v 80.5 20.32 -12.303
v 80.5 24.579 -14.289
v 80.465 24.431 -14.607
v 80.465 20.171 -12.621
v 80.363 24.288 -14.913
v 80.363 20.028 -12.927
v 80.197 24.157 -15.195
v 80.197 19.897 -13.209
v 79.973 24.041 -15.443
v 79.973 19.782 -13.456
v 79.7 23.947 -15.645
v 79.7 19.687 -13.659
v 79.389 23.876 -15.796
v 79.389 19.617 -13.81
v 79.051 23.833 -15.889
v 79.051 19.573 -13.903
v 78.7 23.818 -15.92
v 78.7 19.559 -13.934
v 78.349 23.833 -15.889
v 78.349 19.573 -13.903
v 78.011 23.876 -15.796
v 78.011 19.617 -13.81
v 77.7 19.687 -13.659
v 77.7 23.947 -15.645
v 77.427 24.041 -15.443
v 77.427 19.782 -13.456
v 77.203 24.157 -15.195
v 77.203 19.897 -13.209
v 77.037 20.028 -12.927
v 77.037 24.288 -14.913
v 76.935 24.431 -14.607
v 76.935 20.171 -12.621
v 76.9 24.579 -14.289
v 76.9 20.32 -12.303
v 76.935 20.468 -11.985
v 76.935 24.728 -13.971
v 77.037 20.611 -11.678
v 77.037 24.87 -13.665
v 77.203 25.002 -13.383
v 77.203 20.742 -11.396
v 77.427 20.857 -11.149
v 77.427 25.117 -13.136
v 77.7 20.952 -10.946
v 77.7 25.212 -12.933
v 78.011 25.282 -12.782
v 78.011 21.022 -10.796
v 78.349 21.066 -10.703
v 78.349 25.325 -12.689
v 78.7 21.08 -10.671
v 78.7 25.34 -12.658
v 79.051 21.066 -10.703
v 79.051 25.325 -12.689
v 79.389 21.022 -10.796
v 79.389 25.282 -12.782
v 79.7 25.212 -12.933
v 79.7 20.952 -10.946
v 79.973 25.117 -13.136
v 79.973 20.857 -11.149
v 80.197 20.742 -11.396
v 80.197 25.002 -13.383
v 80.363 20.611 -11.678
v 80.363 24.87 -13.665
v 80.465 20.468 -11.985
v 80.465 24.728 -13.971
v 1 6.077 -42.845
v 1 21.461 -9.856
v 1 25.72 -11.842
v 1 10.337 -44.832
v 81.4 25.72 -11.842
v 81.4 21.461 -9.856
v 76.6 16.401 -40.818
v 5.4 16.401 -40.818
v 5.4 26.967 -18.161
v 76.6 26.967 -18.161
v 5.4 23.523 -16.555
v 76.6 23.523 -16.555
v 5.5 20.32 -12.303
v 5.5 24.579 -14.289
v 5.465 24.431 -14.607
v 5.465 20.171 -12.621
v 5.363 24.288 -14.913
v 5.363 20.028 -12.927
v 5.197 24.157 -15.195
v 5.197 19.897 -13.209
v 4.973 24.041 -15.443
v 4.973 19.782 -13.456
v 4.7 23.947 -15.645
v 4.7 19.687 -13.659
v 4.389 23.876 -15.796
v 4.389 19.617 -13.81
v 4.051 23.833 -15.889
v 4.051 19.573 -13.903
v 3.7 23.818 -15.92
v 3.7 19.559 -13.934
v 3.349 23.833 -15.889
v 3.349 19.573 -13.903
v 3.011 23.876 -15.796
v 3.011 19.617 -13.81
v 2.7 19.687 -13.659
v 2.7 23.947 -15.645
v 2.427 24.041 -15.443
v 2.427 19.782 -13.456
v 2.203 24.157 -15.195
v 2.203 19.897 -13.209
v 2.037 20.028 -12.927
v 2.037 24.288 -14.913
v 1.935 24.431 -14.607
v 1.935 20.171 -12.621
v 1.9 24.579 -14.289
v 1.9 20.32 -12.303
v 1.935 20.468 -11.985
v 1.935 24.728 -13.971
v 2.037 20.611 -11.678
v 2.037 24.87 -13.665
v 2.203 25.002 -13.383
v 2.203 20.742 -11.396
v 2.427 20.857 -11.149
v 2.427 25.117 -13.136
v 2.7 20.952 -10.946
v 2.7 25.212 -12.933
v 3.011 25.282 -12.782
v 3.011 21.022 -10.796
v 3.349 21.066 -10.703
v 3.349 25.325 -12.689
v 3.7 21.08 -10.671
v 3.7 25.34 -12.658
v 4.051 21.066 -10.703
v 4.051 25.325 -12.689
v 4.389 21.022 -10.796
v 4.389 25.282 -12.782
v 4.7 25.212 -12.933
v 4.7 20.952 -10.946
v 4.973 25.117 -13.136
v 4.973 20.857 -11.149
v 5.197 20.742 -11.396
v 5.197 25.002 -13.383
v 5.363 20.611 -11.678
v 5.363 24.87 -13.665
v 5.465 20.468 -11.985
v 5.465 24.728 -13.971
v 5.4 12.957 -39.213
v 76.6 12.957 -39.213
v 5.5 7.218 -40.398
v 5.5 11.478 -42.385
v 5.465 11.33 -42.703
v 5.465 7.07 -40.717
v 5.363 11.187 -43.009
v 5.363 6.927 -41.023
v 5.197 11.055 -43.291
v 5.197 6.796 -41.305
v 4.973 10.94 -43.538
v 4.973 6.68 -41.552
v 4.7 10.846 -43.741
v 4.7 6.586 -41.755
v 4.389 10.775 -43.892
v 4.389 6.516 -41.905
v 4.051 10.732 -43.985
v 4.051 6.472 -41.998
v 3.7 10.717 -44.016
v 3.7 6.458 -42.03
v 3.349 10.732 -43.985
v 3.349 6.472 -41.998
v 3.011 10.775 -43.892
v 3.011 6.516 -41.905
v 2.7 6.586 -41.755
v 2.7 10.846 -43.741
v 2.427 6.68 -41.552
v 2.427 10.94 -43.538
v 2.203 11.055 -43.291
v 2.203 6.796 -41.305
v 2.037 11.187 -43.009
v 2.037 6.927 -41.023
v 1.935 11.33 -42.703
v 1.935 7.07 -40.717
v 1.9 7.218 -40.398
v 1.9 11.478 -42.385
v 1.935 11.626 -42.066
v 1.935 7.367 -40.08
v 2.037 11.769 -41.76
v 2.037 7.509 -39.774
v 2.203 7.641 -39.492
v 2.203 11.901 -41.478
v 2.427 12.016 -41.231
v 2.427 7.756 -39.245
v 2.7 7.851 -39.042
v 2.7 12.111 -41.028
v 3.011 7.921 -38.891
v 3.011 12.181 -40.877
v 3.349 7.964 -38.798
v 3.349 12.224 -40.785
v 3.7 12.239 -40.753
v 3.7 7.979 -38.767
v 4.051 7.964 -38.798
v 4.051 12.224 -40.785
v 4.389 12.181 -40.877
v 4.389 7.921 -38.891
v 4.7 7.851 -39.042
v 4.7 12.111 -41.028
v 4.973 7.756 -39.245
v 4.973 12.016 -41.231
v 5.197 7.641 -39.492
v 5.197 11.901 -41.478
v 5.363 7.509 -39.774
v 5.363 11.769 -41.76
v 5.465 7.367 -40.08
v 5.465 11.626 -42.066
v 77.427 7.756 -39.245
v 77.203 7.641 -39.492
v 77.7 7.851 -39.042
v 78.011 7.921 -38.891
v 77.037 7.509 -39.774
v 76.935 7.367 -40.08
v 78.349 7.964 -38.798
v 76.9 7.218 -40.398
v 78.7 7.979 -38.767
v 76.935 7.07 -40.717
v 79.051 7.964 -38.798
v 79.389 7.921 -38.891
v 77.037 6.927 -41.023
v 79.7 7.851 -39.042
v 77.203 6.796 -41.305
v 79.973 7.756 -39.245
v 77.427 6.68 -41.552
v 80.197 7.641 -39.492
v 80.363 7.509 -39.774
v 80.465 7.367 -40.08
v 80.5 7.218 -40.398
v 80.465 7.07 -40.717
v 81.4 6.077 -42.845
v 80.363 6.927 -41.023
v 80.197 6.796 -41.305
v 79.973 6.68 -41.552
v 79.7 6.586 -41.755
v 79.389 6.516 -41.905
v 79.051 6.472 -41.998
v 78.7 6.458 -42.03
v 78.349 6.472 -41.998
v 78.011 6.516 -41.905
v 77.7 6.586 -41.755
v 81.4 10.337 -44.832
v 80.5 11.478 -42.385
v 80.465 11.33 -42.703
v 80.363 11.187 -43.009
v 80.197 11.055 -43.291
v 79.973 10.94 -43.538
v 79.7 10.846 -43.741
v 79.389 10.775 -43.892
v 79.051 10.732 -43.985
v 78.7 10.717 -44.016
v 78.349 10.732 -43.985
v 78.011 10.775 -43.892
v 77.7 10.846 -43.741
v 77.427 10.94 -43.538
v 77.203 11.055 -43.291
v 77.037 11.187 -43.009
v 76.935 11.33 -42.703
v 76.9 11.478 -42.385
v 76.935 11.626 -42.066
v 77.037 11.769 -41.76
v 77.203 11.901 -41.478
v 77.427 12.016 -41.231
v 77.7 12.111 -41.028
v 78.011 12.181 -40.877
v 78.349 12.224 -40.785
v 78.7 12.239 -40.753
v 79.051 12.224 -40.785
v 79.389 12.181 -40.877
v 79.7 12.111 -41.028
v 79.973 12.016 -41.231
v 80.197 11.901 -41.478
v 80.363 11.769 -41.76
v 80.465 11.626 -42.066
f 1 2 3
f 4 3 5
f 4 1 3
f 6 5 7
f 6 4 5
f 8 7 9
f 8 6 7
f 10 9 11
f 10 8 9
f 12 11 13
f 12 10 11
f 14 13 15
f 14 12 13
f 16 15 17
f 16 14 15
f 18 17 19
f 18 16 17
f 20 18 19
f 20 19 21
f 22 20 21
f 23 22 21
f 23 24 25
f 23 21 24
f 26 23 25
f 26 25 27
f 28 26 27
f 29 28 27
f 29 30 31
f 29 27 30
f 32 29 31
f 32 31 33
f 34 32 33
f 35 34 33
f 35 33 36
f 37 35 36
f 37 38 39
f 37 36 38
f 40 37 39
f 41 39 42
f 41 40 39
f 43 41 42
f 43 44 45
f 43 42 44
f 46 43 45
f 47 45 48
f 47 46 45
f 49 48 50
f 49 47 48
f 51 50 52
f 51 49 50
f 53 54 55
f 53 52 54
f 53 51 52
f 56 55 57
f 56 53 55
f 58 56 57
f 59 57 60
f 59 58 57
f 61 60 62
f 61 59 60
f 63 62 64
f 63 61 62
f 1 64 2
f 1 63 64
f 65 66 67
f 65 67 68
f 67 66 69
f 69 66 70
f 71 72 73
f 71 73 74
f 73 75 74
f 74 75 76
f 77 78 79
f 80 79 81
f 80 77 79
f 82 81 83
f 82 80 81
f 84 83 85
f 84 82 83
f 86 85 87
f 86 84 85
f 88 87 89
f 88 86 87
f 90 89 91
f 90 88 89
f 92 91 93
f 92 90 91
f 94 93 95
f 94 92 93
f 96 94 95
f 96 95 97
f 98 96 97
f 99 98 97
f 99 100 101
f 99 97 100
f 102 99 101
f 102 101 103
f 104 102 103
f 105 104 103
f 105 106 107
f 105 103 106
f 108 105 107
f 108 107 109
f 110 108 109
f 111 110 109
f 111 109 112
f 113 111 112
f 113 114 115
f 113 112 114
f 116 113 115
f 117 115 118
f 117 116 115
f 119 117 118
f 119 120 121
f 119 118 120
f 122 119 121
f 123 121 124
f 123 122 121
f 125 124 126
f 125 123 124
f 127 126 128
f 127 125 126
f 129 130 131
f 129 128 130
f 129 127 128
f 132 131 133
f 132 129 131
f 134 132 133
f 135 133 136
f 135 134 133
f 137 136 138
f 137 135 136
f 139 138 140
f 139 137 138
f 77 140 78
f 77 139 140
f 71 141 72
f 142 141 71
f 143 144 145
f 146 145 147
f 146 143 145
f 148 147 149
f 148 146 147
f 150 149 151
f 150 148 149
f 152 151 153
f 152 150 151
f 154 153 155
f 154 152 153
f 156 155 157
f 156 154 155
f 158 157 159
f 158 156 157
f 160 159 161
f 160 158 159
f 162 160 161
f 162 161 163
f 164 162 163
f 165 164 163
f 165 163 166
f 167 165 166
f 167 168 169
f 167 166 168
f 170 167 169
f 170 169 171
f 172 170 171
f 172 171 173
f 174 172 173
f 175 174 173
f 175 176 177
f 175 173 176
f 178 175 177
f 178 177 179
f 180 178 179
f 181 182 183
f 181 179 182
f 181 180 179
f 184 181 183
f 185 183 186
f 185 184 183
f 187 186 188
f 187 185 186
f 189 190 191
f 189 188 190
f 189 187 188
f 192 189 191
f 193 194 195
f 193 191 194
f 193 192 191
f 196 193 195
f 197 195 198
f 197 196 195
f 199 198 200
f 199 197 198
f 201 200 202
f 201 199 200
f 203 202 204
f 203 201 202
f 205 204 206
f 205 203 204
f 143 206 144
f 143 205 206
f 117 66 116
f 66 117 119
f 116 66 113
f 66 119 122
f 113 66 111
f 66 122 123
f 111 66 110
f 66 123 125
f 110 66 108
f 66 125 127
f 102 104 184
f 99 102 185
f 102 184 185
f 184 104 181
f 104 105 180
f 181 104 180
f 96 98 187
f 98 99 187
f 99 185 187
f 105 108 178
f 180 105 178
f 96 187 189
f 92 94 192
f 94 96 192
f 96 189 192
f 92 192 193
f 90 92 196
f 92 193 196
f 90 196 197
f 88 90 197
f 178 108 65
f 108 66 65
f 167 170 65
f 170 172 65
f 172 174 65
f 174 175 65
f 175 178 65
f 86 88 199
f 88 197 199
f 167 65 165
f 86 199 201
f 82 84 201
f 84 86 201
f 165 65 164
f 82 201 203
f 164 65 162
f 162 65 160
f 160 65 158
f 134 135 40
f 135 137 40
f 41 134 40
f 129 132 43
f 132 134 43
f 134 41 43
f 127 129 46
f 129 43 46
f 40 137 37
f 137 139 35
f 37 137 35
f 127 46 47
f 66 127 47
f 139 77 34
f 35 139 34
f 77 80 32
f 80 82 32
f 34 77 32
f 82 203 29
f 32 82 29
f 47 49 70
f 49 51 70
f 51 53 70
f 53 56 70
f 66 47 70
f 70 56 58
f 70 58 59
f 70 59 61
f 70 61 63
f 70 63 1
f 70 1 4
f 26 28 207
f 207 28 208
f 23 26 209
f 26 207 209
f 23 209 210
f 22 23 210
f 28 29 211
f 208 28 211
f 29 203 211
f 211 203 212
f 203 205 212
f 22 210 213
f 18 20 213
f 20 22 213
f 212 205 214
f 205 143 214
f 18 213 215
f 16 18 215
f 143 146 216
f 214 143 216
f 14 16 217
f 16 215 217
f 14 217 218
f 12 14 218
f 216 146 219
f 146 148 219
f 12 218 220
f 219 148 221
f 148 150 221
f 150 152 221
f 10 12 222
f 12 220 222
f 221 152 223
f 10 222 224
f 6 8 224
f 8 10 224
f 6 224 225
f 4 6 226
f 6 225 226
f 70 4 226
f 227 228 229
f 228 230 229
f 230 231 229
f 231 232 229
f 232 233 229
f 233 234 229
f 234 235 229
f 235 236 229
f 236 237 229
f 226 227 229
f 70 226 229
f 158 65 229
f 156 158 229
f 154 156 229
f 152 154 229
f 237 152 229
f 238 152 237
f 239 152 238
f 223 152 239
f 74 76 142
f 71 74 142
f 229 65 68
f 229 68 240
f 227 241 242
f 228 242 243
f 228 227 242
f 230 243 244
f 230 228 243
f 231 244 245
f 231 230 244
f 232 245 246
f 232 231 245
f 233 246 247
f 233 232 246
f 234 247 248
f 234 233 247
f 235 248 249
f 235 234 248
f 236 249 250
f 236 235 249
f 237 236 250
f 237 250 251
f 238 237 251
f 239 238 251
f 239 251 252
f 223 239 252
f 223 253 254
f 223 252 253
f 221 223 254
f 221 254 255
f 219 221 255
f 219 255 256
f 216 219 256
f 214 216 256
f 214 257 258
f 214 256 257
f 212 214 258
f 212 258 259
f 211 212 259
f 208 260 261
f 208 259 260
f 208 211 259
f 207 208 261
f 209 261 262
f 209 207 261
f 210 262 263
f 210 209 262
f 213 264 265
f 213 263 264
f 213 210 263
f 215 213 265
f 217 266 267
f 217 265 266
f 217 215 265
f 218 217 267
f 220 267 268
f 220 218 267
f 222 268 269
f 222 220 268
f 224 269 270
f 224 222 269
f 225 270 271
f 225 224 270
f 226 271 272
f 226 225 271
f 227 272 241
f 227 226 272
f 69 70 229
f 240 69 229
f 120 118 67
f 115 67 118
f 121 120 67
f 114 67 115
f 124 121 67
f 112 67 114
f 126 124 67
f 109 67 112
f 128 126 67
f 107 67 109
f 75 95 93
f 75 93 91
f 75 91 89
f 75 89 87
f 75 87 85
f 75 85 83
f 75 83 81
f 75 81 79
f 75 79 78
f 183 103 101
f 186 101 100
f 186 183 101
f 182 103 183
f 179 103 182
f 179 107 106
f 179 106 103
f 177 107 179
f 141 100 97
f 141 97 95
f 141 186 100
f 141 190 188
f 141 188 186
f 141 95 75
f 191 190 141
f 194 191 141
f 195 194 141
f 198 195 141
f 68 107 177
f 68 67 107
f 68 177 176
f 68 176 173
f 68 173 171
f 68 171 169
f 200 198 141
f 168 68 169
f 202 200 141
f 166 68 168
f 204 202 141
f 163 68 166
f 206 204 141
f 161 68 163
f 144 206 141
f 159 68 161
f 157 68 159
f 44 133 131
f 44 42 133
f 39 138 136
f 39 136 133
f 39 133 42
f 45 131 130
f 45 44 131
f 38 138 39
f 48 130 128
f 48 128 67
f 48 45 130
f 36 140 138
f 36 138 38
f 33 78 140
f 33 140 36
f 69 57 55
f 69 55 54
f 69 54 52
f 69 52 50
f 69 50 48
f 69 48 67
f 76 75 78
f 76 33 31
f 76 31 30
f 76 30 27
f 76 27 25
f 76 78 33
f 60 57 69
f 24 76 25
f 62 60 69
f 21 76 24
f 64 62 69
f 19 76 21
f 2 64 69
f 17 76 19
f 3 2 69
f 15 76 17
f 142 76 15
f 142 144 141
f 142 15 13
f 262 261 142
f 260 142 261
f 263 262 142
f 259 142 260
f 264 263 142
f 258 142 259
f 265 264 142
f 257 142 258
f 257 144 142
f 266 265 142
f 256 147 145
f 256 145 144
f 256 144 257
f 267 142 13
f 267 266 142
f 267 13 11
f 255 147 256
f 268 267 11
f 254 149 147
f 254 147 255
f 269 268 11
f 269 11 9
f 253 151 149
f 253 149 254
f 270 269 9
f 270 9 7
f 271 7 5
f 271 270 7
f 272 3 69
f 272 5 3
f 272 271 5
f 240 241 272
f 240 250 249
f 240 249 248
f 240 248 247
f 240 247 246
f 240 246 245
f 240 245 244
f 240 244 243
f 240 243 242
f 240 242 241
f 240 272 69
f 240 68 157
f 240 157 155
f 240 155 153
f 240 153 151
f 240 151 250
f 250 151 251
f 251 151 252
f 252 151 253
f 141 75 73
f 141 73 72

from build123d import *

# Parameters (mm, degrees)
CYLINDER002_R           = 1.8
CYLINDER002_DEPTH       = 10
ARRAY003_X_COUNT        = 2
ARRAY003_X_PITCH        = 75
ARRAY003_Y_COUNT        = 2
ARRAY003_Y_PITCH        = 31
BOX008_W                = 80.4
BOX008_H                = 36.4
BOX008_DEPTH            = 4.7
BOX_W                   = 71.2
BOX_H                   = 25
BOX_DEPTH               = 3.8
BODY001_PLACEMENT_ANGLE = 115


with BuildPart() as hole_clone:
    # Cylinder002 → Cylinder002 (new body)
    with BuildSketch(Plane(origin=(3.7, 3.7, 0), x_dir=(1, 0, 0), z_dir=(0, 0, 1))):
        Circle(CYLINDER002_R)
    extrude(amount=CYLINDER002_DEPTH)

    # Array003 X: hole clone ×2


with BuildPart() as hole_clone_1:
    add(hole_clone.part)
    with Locations(*[(i * ARRAY003_X_PITCH, 0, 0) for i in range(1, ARRAY003_X_COUNT)]):
        add(hole_clone.part)

    # Array003 Y: hole clone ×2


with BuildPart() as hole_clone_2:
    add(hole_clone_1.part)
    with Locations(*[(0, i * ARRAY003_Y_PITCH, 0) for i in range(1, ARRAY003_Y_COUNT)]):
        add(hole_clone_1.part)


with BuildPart() as hole_clone_3:
    # Body placement: moved
    add(hole_clone_2.part.moved(Location((-1, -1, 0))))


with BuildPart() as under_display:
    # Box008 → Box008 (new body)
    with BuildSketch(Plane.XY):
        with Locations((40.2, 18.2)):
            Rectangle(BOX008_W, BOX008_H)
    extrude(amount=BOX008_DEPTH)


with BuildPart() as f_16x2_lcd_clone:
    # Box → Box (new body)
    with BuildSketch(Plane(origin=(4.4, 5.2, 4.7), x_dir=(1, 0, 0), z_dir=(0, 0, 1))):
        with Locations((35.6, 12.5)):
            Rectangle(BOX_W, BOX_H)
    extrude(amount=BOX_DEPTH)

    # Fusion004: union under display
    add(under_display.part)

    # Cut: cut hole clone
    add(hole_clone_3.part, mode=Mode.SUBTRACT)


with BuildPart() as f_16x2_lcd_clone_1:
    # Body001 placement: moved
    add(f_16x2_lcd_clone.part.moved(Location((1, 21.460623, -9.855736))).rotate(Axis((1, 21.460623, -9.855736), (-1, 0, 0)), BODY001_PLACEMENT_ANGLE))


solid = f_16x2_lcd_clone_1.part
